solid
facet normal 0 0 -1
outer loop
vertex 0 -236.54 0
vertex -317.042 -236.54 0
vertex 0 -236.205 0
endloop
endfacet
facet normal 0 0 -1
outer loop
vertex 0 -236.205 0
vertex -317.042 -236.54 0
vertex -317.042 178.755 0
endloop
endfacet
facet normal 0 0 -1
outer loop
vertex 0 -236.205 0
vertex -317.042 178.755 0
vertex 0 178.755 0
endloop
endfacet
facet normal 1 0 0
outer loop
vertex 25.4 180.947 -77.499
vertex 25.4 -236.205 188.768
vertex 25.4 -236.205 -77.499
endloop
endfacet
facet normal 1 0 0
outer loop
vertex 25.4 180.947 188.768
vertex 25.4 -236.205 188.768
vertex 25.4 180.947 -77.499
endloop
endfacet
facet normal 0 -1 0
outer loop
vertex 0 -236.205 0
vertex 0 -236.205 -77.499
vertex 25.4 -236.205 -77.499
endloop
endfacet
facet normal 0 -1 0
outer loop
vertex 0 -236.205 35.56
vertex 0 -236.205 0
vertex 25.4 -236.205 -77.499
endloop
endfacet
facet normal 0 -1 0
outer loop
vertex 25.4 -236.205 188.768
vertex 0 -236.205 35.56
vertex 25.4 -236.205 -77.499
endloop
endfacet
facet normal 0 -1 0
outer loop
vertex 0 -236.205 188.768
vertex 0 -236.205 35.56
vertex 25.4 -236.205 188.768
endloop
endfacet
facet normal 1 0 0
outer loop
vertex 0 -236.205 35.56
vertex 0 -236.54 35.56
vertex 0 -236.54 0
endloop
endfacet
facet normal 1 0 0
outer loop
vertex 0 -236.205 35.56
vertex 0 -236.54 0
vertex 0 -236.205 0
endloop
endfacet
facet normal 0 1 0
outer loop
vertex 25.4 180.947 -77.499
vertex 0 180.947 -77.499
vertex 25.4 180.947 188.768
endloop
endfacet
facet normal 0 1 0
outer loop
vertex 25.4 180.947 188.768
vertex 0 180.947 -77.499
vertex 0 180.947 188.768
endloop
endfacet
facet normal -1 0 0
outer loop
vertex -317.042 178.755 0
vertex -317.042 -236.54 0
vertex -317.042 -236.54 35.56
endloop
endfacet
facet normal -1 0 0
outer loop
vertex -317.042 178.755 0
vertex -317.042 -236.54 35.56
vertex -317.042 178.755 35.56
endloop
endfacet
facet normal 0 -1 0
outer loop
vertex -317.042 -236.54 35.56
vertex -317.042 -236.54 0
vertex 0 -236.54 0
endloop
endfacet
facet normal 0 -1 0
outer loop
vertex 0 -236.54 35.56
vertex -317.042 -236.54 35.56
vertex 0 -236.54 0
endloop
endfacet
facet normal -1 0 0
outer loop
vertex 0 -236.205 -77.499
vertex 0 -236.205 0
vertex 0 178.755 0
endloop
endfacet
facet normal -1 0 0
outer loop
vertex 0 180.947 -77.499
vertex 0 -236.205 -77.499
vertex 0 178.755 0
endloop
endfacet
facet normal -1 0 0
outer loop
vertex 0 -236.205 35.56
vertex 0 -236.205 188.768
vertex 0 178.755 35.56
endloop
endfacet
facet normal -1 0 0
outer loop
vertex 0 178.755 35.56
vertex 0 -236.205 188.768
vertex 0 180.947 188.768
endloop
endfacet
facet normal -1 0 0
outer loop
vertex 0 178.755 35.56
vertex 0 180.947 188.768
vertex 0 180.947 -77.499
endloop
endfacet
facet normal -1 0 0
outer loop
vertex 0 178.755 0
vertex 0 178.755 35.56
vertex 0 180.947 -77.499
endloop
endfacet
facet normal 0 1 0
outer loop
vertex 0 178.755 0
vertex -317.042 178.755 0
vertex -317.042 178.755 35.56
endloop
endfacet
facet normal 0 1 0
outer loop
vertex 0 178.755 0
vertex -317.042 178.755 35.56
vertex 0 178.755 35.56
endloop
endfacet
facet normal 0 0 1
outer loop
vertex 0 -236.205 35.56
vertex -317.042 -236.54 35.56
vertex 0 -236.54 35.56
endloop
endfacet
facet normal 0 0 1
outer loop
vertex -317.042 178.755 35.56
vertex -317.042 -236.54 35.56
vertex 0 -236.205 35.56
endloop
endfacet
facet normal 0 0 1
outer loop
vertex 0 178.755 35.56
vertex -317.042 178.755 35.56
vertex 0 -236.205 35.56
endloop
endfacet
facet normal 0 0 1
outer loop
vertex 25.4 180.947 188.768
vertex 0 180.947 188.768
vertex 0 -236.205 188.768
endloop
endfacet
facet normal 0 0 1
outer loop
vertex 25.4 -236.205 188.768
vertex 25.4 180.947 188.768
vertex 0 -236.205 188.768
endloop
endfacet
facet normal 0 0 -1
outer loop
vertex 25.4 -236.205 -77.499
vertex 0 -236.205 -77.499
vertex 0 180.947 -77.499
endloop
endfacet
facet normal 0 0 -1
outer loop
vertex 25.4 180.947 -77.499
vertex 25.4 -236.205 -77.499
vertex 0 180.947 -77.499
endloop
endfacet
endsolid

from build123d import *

# Parameters (mm, degrees)
F0_W     = 236.205176
F0_H     = 266.267627
F0_W_2   = 180.947438
F1_DEPTH = 25.4
F2_W     = 317.041844
F2_H     = 415.295705
F3_DEPTH = 35.56


with BuildPart() as f1:
    # F0 (on Right) → F1 (new body)
    with BuildSketch(Plane.YZ):
        with Locations((-118.102588, 55.634335)):
            Rectangle(F0_W, F0_H)
        with Locations((90.473719, 55.634335)):
            Rectangle(F0_W_2, F0_H)
    extrude(amount=F1_DEPTH)

    # F2 (on Top) → F3 (join)
    with BuildSketch(Plane.XY):
        with Locations((-158.520922, -28.892569)):
            Rectangle(F2_W, F2_H)
    extrude(amount=F3_DEPTH)


solid = f1.part
